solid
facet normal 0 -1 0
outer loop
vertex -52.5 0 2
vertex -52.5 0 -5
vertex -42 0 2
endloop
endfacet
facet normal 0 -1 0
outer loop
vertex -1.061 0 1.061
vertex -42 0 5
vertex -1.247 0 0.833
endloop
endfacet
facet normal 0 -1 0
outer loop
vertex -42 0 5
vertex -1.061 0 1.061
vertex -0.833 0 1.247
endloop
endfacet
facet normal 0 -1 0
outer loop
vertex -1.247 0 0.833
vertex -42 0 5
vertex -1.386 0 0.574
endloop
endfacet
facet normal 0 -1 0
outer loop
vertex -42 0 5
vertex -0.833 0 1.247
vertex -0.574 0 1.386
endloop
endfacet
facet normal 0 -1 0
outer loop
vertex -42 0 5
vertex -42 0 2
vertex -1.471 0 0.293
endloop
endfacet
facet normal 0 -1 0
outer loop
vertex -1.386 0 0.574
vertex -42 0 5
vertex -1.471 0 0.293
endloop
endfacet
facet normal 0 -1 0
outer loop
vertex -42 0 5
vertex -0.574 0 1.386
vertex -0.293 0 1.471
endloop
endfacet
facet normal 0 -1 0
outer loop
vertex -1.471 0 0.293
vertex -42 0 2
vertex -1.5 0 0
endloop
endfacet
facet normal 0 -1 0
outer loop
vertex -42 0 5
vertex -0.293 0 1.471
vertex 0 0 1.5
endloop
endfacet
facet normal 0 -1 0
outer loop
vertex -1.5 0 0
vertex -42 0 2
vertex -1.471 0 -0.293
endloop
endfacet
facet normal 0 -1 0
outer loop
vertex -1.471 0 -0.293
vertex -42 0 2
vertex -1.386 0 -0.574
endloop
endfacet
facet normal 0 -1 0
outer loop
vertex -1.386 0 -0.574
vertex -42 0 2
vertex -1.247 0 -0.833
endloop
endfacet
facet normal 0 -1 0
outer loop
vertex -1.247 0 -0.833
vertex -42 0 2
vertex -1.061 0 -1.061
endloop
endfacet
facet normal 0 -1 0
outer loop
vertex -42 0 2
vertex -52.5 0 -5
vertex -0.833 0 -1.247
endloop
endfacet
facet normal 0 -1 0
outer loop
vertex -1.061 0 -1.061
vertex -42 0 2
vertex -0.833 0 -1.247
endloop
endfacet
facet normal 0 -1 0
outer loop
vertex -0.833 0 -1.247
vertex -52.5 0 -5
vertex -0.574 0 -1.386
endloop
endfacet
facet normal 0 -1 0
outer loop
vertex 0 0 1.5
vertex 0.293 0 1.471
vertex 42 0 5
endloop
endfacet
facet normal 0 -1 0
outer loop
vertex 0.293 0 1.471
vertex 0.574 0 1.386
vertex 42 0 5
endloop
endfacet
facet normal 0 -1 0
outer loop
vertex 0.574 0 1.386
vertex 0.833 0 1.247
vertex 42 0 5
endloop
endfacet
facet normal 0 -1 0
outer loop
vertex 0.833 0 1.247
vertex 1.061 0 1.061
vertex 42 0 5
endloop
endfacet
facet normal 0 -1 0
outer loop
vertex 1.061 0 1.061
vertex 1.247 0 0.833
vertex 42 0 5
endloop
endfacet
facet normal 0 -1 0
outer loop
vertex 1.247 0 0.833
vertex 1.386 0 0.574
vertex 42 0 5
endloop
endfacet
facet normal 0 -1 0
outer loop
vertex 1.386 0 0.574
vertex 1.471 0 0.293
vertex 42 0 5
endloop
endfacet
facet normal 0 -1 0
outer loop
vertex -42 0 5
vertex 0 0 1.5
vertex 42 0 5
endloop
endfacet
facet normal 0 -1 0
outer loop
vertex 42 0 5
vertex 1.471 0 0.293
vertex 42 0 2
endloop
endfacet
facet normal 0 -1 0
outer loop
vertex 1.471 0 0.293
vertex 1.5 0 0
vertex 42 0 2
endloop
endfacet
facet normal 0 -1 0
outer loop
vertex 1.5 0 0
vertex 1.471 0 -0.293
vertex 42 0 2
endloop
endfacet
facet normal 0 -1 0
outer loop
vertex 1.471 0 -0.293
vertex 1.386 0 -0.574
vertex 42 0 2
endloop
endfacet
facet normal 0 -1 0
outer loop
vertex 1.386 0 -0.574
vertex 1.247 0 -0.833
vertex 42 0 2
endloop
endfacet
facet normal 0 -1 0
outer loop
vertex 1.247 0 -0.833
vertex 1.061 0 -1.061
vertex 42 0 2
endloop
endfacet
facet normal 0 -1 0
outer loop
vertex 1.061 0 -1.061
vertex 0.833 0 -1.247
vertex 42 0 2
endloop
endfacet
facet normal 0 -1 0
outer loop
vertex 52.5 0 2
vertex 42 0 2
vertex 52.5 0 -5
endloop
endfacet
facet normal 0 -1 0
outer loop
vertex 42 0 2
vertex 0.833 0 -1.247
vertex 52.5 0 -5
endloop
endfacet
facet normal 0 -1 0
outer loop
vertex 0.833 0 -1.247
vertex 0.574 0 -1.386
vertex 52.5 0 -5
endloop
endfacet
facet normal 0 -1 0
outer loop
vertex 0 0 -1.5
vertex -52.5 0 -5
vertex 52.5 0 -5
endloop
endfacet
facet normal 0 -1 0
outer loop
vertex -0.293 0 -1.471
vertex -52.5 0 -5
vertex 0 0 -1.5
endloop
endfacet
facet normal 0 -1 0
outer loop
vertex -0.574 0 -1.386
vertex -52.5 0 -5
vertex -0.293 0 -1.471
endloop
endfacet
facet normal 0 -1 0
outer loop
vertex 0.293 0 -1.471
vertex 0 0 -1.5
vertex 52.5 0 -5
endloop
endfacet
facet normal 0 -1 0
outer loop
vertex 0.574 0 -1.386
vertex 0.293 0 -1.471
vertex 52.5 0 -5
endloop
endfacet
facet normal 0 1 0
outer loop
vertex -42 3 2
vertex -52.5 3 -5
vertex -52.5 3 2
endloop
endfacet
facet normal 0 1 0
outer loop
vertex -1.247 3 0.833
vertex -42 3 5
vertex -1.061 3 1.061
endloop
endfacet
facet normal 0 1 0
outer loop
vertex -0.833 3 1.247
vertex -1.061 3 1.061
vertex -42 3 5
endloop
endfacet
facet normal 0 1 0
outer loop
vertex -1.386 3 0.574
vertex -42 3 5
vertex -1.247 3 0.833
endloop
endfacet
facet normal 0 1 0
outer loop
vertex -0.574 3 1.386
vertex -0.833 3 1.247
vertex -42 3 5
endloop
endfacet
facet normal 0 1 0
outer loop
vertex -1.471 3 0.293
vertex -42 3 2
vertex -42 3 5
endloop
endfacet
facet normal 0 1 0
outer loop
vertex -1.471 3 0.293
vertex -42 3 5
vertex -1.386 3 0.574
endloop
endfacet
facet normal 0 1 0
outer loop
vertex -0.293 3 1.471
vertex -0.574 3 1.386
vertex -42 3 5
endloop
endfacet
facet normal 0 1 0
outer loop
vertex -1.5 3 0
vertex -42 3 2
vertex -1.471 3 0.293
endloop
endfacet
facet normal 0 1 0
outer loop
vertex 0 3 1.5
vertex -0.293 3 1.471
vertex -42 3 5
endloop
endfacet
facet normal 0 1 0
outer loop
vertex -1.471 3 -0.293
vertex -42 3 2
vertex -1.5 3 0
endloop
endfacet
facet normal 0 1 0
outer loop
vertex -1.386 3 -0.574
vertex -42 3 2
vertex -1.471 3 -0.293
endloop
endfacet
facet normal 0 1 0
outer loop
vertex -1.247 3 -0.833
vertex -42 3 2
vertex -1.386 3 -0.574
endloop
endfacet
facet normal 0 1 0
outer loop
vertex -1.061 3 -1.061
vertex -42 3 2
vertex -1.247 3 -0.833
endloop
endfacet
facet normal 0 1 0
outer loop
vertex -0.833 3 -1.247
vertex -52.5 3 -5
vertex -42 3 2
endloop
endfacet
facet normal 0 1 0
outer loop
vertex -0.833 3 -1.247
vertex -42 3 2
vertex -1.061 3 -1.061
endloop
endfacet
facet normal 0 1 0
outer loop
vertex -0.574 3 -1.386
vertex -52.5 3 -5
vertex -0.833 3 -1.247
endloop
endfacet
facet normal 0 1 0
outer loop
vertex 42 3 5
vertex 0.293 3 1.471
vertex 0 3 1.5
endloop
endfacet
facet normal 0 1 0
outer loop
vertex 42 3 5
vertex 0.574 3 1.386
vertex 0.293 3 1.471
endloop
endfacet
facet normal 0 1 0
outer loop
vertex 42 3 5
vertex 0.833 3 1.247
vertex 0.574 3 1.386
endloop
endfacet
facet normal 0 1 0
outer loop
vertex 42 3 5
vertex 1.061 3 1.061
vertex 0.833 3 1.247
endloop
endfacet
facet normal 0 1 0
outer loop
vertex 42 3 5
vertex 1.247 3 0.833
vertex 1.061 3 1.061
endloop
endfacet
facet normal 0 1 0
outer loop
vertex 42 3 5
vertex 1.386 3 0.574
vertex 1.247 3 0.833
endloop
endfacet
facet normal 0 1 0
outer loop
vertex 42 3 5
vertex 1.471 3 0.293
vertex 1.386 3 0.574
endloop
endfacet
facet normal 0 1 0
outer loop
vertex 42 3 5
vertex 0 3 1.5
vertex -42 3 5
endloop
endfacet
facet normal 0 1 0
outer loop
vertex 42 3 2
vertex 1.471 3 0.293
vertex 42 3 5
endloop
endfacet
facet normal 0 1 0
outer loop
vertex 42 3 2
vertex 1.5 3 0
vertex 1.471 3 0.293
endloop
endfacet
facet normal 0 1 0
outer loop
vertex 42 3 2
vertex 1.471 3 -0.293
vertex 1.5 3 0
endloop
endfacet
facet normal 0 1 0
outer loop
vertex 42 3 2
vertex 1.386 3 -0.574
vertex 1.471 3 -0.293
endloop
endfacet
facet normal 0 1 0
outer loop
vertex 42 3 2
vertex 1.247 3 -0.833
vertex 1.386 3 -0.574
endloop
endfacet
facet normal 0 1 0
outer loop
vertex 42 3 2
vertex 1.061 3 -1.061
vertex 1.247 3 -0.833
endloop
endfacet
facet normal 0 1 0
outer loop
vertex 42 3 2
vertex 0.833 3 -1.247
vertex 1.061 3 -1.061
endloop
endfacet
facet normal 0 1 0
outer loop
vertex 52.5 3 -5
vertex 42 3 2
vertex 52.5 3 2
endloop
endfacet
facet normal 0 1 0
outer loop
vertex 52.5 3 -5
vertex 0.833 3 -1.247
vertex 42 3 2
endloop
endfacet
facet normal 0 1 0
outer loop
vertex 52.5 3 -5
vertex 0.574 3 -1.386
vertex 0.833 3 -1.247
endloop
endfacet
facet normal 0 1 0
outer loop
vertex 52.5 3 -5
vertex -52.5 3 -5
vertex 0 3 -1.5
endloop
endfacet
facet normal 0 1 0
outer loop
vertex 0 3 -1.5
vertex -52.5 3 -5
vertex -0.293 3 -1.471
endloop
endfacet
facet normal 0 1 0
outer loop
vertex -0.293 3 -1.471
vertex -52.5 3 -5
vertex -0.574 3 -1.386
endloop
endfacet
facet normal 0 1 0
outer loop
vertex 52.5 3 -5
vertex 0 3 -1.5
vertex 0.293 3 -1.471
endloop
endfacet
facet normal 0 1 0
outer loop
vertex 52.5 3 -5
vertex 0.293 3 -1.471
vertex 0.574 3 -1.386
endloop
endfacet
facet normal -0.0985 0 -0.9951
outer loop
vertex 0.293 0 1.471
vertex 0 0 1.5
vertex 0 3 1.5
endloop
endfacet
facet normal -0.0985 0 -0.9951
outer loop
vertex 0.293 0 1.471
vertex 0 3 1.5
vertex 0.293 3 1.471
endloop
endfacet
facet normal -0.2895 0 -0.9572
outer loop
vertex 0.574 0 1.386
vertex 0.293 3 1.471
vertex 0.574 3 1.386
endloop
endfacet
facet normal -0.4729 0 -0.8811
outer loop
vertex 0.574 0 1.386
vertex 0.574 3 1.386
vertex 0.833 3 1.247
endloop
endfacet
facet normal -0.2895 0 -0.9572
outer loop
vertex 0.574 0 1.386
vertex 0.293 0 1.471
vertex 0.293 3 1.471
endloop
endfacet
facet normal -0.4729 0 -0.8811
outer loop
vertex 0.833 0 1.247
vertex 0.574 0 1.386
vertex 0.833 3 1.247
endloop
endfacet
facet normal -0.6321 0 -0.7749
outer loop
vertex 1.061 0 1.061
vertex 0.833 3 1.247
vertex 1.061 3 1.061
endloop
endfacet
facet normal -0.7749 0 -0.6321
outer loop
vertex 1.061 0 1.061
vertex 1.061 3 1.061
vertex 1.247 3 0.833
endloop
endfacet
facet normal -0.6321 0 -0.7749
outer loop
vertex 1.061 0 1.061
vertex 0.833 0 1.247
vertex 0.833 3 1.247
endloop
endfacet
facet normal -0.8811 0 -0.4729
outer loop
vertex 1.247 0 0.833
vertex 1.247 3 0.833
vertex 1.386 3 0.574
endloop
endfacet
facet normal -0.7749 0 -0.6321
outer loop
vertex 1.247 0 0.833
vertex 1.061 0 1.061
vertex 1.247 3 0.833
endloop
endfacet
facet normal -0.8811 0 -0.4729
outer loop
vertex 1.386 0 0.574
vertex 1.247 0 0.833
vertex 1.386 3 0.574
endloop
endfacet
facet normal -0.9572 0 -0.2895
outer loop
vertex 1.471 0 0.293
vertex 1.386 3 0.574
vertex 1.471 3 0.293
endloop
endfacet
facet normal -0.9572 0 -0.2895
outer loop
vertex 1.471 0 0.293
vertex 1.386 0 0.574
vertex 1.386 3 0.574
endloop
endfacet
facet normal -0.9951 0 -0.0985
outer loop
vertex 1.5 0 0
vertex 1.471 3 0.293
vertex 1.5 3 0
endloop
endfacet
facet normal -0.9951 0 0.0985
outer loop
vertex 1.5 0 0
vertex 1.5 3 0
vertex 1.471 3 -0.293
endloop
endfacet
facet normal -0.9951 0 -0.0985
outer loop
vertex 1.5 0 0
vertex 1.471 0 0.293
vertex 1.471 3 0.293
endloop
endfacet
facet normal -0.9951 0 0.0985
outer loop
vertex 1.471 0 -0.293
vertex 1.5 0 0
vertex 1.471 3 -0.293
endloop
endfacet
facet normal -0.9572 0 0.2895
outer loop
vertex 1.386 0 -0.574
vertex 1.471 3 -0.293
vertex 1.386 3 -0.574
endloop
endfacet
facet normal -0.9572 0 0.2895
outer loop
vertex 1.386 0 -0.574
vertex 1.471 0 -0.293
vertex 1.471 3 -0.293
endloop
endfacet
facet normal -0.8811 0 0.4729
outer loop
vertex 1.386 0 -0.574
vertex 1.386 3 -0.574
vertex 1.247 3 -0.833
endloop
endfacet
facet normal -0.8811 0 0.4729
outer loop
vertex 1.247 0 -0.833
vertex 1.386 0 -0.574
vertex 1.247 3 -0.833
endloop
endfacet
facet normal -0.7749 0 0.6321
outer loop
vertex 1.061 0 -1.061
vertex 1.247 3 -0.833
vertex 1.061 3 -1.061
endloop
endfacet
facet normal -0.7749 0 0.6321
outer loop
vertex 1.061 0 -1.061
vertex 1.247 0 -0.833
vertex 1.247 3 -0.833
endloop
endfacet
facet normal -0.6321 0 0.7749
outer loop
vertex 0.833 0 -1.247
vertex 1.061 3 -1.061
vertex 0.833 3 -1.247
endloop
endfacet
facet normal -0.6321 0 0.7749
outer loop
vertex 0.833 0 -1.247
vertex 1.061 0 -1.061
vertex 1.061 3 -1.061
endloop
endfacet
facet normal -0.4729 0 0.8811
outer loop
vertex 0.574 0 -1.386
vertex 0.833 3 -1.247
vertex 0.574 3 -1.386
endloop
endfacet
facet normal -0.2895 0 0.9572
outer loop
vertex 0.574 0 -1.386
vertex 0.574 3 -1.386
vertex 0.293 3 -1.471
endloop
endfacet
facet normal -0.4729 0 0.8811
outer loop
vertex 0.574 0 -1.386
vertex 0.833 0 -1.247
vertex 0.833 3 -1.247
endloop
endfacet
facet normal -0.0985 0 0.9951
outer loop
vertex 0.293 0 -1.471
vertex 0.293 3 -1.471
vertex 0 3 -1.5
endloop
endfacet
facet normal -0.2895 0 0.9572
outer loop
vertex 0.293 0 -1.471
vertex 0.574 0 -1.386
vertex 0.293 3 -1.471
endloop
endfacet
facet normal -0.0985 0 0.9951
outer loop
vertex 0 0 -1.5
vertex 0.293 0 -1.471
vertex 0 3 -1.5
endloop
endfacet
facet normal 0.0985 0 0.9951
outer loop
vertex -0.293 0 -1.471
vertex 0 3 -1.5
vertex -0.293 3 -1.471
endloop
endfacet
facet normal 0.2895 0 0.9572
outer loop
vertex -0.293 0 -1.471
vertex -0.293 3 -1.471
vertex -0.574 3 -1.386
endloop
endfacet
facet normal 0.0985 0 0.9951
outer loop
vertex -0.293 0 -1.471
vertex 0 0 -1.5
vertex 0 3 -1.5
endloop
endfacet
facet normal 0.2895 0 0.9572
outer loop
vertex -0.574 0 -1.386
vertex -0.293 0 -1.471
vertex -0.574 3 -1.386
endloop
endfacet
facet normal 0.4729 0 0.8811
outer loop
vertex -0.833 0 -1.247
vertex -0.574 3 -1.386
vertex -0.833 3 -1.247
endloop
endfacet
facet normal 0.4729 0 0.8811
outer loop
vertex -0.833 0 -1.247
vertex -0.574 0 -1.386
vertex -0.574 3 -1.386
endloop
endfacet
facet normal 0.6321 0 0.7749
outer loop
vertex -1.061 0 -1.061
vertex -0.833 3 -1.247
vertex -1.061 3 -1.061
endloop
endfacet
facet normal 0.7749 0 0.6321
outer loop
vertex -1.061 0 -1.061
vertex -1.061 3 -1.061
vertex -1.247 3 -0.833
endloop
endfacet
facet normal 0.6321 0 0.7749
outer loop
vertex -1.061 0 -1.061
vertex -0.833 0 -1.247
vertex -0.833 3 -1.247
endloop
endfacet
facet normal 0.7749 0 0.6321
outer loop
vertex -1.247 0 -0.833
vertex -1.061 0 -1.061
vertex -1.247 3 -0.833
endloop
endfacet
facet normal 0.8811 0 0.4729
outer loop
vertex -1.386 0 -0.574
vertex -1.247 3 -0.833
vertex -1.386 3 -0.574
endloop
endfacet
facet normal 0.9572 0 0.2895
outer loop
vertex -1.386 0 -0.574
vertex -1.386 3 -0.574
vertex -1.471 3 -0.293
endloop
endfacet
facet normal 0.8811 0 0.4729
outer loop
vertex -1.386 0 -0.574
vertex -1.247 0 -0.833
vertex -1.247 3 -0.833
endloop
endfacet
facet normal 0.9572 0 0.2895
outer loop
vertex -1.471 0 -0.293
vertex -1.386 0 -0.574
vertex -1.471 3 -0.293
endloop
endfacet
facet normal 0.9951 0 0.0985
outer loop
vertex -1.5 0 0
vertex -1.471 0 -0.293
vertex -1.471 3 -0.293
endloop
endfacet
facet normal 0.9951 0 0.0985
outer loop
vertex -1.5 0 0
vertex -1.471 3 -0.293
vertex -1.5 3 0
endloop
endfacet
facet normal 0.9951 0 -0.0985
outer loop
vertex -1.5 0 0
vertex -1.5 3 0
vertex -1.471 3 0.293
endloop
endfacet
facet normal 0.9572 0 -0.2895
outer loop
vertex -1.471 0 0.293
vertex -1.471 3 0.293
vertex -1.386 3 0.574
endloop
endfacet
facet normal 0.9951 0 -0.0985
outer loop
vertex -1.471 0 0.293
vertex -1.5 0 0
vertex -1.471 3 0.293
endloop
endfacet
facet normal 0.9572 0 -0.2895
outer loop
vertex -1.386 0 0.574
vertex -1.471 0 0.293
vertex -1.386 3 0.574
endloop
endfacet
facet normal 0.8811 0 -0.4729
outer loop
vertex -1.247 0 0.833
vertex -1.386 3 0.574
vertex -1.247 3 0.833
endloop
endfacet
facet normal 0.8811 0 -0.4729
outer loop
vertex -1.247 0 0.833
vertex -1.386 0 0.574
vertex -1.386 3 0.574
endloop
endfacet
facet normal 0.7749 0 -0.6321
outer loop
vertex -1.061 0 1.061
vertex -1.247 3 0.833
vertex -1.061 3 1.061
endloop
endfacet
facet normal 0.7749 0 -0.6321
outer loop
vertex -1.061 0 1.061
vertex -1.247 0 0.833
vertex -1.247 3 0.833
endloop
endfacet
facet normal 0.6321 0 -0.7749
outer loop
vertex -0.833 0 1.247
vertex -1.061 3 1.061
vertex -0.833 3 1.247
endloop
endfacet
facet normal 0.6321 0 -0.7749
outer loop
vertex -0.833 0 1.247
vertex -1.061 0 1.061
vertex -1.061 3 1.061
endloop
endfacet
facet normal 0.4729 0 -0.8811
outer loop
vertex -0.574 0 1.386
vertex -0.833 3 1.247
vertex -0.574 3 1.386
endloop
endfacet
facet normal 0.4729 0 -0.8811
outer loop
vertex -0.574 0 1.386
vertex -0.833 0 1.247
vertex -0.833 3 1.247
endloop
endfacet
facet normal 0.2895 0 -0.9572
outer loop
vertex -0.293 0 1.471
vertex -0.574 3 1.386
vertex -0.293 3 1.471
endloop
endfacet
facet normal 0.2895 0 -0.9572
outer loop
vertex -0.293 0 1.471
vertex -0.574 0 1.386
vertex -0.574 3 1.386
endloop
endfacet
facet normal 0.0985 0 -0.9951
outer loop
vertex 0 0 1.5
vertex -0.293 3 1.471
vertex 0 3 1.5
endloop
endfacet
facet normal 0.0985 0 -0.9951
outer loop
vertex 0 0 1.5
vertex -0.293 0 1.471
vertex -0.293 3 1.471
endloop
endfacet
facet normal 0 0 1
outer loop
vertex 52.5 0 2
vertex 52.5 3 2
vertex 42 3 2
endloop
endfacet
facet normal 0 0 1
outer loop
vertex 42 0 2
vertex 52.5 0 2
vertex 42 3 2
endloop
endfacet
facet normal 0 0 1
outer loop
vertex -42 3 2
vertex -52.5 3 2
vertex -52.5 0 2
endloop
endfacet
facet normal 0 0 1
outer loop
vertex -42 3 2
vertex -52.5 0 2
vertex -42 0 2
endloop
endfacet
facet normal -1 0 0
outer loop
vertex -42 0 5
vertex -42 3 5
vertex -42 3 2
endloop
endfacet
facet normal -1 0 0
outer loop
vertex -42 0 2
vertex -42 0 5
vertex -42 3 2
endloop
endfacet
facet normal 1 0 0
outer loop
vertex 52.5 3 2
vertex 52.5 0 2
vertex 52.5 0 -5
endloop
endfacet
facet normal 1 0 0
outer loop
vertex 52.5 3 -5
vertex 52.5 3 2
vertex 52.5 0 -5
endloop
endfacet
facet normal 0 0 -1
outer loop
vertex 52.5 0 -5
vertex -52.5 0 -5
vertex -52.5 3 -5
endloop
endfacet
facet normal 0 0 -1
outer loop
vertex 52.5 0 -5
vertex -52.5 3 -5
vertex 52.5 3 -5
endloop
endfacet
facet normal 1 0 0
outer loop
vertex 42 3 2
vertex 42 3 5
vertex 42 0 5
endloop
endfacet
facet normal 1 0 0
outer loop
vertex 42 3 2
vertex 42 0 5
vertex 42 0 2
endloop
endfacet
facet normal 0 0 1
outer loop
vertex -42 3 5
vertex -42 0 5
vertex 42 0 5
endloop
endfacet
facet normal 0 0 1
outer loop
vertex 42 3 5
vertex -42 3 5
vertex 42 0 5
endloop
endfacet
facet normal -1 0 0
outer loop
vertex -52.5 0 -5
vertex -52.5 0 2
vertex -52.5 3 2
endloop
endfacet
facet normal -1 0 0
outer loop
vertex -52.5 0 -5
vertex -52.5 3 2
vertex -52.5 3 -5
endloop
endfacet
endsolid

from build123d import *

# Parameters (mm, degrees)
SKETCH1_W           = 105
SKETCH1_H           = 10
SKETCH1_R           = 1.5
BOSS_EXTRUDE1_DEPTH = 3
SKETCH2_W           = 10.5
SKETCH2_H           = 3
CUT_EXTRUDE1_DEPTH  = 53.82281704


with BuildPart() as part:
    # Sketch1 → Boss-Extrude1 (new body)
    with BuildSketch(Plane(origin=(0, 0, 0), x_dir=(1, 0, 0), z_dir=(0, 1, 0))):
        Rectangle(SKETCH1_W, SKETCH1_H)
        with Locations(Location((0, 0, 0), (0, 0, 270))):
            Circle(SKETCH1_R, mode=Mode.SUBTRACT)
    extrude(amount=BOSS_EXTRUDE1_DEPTH)

    # Sketch2 → Cut-Extrude1 (cut, through all)
    with BuildSketch(Plane(origin=(0, 3, 0), x_dir=(1, 0, 0), z_dir=(0, 1, 0))):
        with Locations((-47.25, -3.5)):
            Rectangle(SKETCH2_W, SKETCH2_H)
    cut_extrude1 = extrude(amount=-CUT_EXTRUDE1_DEPTH, mode=Mode.SUBTRACT)

    # Mirror2: Cut-Extrude1 across plane
    add(cut_extrude1.mirror(Plane(origin=(0, 0, 0), x_dir=(0, 0, 1), z_dir=(1, 0, 0))), mode=Mode.SUBTRACT)


solid = part.part
